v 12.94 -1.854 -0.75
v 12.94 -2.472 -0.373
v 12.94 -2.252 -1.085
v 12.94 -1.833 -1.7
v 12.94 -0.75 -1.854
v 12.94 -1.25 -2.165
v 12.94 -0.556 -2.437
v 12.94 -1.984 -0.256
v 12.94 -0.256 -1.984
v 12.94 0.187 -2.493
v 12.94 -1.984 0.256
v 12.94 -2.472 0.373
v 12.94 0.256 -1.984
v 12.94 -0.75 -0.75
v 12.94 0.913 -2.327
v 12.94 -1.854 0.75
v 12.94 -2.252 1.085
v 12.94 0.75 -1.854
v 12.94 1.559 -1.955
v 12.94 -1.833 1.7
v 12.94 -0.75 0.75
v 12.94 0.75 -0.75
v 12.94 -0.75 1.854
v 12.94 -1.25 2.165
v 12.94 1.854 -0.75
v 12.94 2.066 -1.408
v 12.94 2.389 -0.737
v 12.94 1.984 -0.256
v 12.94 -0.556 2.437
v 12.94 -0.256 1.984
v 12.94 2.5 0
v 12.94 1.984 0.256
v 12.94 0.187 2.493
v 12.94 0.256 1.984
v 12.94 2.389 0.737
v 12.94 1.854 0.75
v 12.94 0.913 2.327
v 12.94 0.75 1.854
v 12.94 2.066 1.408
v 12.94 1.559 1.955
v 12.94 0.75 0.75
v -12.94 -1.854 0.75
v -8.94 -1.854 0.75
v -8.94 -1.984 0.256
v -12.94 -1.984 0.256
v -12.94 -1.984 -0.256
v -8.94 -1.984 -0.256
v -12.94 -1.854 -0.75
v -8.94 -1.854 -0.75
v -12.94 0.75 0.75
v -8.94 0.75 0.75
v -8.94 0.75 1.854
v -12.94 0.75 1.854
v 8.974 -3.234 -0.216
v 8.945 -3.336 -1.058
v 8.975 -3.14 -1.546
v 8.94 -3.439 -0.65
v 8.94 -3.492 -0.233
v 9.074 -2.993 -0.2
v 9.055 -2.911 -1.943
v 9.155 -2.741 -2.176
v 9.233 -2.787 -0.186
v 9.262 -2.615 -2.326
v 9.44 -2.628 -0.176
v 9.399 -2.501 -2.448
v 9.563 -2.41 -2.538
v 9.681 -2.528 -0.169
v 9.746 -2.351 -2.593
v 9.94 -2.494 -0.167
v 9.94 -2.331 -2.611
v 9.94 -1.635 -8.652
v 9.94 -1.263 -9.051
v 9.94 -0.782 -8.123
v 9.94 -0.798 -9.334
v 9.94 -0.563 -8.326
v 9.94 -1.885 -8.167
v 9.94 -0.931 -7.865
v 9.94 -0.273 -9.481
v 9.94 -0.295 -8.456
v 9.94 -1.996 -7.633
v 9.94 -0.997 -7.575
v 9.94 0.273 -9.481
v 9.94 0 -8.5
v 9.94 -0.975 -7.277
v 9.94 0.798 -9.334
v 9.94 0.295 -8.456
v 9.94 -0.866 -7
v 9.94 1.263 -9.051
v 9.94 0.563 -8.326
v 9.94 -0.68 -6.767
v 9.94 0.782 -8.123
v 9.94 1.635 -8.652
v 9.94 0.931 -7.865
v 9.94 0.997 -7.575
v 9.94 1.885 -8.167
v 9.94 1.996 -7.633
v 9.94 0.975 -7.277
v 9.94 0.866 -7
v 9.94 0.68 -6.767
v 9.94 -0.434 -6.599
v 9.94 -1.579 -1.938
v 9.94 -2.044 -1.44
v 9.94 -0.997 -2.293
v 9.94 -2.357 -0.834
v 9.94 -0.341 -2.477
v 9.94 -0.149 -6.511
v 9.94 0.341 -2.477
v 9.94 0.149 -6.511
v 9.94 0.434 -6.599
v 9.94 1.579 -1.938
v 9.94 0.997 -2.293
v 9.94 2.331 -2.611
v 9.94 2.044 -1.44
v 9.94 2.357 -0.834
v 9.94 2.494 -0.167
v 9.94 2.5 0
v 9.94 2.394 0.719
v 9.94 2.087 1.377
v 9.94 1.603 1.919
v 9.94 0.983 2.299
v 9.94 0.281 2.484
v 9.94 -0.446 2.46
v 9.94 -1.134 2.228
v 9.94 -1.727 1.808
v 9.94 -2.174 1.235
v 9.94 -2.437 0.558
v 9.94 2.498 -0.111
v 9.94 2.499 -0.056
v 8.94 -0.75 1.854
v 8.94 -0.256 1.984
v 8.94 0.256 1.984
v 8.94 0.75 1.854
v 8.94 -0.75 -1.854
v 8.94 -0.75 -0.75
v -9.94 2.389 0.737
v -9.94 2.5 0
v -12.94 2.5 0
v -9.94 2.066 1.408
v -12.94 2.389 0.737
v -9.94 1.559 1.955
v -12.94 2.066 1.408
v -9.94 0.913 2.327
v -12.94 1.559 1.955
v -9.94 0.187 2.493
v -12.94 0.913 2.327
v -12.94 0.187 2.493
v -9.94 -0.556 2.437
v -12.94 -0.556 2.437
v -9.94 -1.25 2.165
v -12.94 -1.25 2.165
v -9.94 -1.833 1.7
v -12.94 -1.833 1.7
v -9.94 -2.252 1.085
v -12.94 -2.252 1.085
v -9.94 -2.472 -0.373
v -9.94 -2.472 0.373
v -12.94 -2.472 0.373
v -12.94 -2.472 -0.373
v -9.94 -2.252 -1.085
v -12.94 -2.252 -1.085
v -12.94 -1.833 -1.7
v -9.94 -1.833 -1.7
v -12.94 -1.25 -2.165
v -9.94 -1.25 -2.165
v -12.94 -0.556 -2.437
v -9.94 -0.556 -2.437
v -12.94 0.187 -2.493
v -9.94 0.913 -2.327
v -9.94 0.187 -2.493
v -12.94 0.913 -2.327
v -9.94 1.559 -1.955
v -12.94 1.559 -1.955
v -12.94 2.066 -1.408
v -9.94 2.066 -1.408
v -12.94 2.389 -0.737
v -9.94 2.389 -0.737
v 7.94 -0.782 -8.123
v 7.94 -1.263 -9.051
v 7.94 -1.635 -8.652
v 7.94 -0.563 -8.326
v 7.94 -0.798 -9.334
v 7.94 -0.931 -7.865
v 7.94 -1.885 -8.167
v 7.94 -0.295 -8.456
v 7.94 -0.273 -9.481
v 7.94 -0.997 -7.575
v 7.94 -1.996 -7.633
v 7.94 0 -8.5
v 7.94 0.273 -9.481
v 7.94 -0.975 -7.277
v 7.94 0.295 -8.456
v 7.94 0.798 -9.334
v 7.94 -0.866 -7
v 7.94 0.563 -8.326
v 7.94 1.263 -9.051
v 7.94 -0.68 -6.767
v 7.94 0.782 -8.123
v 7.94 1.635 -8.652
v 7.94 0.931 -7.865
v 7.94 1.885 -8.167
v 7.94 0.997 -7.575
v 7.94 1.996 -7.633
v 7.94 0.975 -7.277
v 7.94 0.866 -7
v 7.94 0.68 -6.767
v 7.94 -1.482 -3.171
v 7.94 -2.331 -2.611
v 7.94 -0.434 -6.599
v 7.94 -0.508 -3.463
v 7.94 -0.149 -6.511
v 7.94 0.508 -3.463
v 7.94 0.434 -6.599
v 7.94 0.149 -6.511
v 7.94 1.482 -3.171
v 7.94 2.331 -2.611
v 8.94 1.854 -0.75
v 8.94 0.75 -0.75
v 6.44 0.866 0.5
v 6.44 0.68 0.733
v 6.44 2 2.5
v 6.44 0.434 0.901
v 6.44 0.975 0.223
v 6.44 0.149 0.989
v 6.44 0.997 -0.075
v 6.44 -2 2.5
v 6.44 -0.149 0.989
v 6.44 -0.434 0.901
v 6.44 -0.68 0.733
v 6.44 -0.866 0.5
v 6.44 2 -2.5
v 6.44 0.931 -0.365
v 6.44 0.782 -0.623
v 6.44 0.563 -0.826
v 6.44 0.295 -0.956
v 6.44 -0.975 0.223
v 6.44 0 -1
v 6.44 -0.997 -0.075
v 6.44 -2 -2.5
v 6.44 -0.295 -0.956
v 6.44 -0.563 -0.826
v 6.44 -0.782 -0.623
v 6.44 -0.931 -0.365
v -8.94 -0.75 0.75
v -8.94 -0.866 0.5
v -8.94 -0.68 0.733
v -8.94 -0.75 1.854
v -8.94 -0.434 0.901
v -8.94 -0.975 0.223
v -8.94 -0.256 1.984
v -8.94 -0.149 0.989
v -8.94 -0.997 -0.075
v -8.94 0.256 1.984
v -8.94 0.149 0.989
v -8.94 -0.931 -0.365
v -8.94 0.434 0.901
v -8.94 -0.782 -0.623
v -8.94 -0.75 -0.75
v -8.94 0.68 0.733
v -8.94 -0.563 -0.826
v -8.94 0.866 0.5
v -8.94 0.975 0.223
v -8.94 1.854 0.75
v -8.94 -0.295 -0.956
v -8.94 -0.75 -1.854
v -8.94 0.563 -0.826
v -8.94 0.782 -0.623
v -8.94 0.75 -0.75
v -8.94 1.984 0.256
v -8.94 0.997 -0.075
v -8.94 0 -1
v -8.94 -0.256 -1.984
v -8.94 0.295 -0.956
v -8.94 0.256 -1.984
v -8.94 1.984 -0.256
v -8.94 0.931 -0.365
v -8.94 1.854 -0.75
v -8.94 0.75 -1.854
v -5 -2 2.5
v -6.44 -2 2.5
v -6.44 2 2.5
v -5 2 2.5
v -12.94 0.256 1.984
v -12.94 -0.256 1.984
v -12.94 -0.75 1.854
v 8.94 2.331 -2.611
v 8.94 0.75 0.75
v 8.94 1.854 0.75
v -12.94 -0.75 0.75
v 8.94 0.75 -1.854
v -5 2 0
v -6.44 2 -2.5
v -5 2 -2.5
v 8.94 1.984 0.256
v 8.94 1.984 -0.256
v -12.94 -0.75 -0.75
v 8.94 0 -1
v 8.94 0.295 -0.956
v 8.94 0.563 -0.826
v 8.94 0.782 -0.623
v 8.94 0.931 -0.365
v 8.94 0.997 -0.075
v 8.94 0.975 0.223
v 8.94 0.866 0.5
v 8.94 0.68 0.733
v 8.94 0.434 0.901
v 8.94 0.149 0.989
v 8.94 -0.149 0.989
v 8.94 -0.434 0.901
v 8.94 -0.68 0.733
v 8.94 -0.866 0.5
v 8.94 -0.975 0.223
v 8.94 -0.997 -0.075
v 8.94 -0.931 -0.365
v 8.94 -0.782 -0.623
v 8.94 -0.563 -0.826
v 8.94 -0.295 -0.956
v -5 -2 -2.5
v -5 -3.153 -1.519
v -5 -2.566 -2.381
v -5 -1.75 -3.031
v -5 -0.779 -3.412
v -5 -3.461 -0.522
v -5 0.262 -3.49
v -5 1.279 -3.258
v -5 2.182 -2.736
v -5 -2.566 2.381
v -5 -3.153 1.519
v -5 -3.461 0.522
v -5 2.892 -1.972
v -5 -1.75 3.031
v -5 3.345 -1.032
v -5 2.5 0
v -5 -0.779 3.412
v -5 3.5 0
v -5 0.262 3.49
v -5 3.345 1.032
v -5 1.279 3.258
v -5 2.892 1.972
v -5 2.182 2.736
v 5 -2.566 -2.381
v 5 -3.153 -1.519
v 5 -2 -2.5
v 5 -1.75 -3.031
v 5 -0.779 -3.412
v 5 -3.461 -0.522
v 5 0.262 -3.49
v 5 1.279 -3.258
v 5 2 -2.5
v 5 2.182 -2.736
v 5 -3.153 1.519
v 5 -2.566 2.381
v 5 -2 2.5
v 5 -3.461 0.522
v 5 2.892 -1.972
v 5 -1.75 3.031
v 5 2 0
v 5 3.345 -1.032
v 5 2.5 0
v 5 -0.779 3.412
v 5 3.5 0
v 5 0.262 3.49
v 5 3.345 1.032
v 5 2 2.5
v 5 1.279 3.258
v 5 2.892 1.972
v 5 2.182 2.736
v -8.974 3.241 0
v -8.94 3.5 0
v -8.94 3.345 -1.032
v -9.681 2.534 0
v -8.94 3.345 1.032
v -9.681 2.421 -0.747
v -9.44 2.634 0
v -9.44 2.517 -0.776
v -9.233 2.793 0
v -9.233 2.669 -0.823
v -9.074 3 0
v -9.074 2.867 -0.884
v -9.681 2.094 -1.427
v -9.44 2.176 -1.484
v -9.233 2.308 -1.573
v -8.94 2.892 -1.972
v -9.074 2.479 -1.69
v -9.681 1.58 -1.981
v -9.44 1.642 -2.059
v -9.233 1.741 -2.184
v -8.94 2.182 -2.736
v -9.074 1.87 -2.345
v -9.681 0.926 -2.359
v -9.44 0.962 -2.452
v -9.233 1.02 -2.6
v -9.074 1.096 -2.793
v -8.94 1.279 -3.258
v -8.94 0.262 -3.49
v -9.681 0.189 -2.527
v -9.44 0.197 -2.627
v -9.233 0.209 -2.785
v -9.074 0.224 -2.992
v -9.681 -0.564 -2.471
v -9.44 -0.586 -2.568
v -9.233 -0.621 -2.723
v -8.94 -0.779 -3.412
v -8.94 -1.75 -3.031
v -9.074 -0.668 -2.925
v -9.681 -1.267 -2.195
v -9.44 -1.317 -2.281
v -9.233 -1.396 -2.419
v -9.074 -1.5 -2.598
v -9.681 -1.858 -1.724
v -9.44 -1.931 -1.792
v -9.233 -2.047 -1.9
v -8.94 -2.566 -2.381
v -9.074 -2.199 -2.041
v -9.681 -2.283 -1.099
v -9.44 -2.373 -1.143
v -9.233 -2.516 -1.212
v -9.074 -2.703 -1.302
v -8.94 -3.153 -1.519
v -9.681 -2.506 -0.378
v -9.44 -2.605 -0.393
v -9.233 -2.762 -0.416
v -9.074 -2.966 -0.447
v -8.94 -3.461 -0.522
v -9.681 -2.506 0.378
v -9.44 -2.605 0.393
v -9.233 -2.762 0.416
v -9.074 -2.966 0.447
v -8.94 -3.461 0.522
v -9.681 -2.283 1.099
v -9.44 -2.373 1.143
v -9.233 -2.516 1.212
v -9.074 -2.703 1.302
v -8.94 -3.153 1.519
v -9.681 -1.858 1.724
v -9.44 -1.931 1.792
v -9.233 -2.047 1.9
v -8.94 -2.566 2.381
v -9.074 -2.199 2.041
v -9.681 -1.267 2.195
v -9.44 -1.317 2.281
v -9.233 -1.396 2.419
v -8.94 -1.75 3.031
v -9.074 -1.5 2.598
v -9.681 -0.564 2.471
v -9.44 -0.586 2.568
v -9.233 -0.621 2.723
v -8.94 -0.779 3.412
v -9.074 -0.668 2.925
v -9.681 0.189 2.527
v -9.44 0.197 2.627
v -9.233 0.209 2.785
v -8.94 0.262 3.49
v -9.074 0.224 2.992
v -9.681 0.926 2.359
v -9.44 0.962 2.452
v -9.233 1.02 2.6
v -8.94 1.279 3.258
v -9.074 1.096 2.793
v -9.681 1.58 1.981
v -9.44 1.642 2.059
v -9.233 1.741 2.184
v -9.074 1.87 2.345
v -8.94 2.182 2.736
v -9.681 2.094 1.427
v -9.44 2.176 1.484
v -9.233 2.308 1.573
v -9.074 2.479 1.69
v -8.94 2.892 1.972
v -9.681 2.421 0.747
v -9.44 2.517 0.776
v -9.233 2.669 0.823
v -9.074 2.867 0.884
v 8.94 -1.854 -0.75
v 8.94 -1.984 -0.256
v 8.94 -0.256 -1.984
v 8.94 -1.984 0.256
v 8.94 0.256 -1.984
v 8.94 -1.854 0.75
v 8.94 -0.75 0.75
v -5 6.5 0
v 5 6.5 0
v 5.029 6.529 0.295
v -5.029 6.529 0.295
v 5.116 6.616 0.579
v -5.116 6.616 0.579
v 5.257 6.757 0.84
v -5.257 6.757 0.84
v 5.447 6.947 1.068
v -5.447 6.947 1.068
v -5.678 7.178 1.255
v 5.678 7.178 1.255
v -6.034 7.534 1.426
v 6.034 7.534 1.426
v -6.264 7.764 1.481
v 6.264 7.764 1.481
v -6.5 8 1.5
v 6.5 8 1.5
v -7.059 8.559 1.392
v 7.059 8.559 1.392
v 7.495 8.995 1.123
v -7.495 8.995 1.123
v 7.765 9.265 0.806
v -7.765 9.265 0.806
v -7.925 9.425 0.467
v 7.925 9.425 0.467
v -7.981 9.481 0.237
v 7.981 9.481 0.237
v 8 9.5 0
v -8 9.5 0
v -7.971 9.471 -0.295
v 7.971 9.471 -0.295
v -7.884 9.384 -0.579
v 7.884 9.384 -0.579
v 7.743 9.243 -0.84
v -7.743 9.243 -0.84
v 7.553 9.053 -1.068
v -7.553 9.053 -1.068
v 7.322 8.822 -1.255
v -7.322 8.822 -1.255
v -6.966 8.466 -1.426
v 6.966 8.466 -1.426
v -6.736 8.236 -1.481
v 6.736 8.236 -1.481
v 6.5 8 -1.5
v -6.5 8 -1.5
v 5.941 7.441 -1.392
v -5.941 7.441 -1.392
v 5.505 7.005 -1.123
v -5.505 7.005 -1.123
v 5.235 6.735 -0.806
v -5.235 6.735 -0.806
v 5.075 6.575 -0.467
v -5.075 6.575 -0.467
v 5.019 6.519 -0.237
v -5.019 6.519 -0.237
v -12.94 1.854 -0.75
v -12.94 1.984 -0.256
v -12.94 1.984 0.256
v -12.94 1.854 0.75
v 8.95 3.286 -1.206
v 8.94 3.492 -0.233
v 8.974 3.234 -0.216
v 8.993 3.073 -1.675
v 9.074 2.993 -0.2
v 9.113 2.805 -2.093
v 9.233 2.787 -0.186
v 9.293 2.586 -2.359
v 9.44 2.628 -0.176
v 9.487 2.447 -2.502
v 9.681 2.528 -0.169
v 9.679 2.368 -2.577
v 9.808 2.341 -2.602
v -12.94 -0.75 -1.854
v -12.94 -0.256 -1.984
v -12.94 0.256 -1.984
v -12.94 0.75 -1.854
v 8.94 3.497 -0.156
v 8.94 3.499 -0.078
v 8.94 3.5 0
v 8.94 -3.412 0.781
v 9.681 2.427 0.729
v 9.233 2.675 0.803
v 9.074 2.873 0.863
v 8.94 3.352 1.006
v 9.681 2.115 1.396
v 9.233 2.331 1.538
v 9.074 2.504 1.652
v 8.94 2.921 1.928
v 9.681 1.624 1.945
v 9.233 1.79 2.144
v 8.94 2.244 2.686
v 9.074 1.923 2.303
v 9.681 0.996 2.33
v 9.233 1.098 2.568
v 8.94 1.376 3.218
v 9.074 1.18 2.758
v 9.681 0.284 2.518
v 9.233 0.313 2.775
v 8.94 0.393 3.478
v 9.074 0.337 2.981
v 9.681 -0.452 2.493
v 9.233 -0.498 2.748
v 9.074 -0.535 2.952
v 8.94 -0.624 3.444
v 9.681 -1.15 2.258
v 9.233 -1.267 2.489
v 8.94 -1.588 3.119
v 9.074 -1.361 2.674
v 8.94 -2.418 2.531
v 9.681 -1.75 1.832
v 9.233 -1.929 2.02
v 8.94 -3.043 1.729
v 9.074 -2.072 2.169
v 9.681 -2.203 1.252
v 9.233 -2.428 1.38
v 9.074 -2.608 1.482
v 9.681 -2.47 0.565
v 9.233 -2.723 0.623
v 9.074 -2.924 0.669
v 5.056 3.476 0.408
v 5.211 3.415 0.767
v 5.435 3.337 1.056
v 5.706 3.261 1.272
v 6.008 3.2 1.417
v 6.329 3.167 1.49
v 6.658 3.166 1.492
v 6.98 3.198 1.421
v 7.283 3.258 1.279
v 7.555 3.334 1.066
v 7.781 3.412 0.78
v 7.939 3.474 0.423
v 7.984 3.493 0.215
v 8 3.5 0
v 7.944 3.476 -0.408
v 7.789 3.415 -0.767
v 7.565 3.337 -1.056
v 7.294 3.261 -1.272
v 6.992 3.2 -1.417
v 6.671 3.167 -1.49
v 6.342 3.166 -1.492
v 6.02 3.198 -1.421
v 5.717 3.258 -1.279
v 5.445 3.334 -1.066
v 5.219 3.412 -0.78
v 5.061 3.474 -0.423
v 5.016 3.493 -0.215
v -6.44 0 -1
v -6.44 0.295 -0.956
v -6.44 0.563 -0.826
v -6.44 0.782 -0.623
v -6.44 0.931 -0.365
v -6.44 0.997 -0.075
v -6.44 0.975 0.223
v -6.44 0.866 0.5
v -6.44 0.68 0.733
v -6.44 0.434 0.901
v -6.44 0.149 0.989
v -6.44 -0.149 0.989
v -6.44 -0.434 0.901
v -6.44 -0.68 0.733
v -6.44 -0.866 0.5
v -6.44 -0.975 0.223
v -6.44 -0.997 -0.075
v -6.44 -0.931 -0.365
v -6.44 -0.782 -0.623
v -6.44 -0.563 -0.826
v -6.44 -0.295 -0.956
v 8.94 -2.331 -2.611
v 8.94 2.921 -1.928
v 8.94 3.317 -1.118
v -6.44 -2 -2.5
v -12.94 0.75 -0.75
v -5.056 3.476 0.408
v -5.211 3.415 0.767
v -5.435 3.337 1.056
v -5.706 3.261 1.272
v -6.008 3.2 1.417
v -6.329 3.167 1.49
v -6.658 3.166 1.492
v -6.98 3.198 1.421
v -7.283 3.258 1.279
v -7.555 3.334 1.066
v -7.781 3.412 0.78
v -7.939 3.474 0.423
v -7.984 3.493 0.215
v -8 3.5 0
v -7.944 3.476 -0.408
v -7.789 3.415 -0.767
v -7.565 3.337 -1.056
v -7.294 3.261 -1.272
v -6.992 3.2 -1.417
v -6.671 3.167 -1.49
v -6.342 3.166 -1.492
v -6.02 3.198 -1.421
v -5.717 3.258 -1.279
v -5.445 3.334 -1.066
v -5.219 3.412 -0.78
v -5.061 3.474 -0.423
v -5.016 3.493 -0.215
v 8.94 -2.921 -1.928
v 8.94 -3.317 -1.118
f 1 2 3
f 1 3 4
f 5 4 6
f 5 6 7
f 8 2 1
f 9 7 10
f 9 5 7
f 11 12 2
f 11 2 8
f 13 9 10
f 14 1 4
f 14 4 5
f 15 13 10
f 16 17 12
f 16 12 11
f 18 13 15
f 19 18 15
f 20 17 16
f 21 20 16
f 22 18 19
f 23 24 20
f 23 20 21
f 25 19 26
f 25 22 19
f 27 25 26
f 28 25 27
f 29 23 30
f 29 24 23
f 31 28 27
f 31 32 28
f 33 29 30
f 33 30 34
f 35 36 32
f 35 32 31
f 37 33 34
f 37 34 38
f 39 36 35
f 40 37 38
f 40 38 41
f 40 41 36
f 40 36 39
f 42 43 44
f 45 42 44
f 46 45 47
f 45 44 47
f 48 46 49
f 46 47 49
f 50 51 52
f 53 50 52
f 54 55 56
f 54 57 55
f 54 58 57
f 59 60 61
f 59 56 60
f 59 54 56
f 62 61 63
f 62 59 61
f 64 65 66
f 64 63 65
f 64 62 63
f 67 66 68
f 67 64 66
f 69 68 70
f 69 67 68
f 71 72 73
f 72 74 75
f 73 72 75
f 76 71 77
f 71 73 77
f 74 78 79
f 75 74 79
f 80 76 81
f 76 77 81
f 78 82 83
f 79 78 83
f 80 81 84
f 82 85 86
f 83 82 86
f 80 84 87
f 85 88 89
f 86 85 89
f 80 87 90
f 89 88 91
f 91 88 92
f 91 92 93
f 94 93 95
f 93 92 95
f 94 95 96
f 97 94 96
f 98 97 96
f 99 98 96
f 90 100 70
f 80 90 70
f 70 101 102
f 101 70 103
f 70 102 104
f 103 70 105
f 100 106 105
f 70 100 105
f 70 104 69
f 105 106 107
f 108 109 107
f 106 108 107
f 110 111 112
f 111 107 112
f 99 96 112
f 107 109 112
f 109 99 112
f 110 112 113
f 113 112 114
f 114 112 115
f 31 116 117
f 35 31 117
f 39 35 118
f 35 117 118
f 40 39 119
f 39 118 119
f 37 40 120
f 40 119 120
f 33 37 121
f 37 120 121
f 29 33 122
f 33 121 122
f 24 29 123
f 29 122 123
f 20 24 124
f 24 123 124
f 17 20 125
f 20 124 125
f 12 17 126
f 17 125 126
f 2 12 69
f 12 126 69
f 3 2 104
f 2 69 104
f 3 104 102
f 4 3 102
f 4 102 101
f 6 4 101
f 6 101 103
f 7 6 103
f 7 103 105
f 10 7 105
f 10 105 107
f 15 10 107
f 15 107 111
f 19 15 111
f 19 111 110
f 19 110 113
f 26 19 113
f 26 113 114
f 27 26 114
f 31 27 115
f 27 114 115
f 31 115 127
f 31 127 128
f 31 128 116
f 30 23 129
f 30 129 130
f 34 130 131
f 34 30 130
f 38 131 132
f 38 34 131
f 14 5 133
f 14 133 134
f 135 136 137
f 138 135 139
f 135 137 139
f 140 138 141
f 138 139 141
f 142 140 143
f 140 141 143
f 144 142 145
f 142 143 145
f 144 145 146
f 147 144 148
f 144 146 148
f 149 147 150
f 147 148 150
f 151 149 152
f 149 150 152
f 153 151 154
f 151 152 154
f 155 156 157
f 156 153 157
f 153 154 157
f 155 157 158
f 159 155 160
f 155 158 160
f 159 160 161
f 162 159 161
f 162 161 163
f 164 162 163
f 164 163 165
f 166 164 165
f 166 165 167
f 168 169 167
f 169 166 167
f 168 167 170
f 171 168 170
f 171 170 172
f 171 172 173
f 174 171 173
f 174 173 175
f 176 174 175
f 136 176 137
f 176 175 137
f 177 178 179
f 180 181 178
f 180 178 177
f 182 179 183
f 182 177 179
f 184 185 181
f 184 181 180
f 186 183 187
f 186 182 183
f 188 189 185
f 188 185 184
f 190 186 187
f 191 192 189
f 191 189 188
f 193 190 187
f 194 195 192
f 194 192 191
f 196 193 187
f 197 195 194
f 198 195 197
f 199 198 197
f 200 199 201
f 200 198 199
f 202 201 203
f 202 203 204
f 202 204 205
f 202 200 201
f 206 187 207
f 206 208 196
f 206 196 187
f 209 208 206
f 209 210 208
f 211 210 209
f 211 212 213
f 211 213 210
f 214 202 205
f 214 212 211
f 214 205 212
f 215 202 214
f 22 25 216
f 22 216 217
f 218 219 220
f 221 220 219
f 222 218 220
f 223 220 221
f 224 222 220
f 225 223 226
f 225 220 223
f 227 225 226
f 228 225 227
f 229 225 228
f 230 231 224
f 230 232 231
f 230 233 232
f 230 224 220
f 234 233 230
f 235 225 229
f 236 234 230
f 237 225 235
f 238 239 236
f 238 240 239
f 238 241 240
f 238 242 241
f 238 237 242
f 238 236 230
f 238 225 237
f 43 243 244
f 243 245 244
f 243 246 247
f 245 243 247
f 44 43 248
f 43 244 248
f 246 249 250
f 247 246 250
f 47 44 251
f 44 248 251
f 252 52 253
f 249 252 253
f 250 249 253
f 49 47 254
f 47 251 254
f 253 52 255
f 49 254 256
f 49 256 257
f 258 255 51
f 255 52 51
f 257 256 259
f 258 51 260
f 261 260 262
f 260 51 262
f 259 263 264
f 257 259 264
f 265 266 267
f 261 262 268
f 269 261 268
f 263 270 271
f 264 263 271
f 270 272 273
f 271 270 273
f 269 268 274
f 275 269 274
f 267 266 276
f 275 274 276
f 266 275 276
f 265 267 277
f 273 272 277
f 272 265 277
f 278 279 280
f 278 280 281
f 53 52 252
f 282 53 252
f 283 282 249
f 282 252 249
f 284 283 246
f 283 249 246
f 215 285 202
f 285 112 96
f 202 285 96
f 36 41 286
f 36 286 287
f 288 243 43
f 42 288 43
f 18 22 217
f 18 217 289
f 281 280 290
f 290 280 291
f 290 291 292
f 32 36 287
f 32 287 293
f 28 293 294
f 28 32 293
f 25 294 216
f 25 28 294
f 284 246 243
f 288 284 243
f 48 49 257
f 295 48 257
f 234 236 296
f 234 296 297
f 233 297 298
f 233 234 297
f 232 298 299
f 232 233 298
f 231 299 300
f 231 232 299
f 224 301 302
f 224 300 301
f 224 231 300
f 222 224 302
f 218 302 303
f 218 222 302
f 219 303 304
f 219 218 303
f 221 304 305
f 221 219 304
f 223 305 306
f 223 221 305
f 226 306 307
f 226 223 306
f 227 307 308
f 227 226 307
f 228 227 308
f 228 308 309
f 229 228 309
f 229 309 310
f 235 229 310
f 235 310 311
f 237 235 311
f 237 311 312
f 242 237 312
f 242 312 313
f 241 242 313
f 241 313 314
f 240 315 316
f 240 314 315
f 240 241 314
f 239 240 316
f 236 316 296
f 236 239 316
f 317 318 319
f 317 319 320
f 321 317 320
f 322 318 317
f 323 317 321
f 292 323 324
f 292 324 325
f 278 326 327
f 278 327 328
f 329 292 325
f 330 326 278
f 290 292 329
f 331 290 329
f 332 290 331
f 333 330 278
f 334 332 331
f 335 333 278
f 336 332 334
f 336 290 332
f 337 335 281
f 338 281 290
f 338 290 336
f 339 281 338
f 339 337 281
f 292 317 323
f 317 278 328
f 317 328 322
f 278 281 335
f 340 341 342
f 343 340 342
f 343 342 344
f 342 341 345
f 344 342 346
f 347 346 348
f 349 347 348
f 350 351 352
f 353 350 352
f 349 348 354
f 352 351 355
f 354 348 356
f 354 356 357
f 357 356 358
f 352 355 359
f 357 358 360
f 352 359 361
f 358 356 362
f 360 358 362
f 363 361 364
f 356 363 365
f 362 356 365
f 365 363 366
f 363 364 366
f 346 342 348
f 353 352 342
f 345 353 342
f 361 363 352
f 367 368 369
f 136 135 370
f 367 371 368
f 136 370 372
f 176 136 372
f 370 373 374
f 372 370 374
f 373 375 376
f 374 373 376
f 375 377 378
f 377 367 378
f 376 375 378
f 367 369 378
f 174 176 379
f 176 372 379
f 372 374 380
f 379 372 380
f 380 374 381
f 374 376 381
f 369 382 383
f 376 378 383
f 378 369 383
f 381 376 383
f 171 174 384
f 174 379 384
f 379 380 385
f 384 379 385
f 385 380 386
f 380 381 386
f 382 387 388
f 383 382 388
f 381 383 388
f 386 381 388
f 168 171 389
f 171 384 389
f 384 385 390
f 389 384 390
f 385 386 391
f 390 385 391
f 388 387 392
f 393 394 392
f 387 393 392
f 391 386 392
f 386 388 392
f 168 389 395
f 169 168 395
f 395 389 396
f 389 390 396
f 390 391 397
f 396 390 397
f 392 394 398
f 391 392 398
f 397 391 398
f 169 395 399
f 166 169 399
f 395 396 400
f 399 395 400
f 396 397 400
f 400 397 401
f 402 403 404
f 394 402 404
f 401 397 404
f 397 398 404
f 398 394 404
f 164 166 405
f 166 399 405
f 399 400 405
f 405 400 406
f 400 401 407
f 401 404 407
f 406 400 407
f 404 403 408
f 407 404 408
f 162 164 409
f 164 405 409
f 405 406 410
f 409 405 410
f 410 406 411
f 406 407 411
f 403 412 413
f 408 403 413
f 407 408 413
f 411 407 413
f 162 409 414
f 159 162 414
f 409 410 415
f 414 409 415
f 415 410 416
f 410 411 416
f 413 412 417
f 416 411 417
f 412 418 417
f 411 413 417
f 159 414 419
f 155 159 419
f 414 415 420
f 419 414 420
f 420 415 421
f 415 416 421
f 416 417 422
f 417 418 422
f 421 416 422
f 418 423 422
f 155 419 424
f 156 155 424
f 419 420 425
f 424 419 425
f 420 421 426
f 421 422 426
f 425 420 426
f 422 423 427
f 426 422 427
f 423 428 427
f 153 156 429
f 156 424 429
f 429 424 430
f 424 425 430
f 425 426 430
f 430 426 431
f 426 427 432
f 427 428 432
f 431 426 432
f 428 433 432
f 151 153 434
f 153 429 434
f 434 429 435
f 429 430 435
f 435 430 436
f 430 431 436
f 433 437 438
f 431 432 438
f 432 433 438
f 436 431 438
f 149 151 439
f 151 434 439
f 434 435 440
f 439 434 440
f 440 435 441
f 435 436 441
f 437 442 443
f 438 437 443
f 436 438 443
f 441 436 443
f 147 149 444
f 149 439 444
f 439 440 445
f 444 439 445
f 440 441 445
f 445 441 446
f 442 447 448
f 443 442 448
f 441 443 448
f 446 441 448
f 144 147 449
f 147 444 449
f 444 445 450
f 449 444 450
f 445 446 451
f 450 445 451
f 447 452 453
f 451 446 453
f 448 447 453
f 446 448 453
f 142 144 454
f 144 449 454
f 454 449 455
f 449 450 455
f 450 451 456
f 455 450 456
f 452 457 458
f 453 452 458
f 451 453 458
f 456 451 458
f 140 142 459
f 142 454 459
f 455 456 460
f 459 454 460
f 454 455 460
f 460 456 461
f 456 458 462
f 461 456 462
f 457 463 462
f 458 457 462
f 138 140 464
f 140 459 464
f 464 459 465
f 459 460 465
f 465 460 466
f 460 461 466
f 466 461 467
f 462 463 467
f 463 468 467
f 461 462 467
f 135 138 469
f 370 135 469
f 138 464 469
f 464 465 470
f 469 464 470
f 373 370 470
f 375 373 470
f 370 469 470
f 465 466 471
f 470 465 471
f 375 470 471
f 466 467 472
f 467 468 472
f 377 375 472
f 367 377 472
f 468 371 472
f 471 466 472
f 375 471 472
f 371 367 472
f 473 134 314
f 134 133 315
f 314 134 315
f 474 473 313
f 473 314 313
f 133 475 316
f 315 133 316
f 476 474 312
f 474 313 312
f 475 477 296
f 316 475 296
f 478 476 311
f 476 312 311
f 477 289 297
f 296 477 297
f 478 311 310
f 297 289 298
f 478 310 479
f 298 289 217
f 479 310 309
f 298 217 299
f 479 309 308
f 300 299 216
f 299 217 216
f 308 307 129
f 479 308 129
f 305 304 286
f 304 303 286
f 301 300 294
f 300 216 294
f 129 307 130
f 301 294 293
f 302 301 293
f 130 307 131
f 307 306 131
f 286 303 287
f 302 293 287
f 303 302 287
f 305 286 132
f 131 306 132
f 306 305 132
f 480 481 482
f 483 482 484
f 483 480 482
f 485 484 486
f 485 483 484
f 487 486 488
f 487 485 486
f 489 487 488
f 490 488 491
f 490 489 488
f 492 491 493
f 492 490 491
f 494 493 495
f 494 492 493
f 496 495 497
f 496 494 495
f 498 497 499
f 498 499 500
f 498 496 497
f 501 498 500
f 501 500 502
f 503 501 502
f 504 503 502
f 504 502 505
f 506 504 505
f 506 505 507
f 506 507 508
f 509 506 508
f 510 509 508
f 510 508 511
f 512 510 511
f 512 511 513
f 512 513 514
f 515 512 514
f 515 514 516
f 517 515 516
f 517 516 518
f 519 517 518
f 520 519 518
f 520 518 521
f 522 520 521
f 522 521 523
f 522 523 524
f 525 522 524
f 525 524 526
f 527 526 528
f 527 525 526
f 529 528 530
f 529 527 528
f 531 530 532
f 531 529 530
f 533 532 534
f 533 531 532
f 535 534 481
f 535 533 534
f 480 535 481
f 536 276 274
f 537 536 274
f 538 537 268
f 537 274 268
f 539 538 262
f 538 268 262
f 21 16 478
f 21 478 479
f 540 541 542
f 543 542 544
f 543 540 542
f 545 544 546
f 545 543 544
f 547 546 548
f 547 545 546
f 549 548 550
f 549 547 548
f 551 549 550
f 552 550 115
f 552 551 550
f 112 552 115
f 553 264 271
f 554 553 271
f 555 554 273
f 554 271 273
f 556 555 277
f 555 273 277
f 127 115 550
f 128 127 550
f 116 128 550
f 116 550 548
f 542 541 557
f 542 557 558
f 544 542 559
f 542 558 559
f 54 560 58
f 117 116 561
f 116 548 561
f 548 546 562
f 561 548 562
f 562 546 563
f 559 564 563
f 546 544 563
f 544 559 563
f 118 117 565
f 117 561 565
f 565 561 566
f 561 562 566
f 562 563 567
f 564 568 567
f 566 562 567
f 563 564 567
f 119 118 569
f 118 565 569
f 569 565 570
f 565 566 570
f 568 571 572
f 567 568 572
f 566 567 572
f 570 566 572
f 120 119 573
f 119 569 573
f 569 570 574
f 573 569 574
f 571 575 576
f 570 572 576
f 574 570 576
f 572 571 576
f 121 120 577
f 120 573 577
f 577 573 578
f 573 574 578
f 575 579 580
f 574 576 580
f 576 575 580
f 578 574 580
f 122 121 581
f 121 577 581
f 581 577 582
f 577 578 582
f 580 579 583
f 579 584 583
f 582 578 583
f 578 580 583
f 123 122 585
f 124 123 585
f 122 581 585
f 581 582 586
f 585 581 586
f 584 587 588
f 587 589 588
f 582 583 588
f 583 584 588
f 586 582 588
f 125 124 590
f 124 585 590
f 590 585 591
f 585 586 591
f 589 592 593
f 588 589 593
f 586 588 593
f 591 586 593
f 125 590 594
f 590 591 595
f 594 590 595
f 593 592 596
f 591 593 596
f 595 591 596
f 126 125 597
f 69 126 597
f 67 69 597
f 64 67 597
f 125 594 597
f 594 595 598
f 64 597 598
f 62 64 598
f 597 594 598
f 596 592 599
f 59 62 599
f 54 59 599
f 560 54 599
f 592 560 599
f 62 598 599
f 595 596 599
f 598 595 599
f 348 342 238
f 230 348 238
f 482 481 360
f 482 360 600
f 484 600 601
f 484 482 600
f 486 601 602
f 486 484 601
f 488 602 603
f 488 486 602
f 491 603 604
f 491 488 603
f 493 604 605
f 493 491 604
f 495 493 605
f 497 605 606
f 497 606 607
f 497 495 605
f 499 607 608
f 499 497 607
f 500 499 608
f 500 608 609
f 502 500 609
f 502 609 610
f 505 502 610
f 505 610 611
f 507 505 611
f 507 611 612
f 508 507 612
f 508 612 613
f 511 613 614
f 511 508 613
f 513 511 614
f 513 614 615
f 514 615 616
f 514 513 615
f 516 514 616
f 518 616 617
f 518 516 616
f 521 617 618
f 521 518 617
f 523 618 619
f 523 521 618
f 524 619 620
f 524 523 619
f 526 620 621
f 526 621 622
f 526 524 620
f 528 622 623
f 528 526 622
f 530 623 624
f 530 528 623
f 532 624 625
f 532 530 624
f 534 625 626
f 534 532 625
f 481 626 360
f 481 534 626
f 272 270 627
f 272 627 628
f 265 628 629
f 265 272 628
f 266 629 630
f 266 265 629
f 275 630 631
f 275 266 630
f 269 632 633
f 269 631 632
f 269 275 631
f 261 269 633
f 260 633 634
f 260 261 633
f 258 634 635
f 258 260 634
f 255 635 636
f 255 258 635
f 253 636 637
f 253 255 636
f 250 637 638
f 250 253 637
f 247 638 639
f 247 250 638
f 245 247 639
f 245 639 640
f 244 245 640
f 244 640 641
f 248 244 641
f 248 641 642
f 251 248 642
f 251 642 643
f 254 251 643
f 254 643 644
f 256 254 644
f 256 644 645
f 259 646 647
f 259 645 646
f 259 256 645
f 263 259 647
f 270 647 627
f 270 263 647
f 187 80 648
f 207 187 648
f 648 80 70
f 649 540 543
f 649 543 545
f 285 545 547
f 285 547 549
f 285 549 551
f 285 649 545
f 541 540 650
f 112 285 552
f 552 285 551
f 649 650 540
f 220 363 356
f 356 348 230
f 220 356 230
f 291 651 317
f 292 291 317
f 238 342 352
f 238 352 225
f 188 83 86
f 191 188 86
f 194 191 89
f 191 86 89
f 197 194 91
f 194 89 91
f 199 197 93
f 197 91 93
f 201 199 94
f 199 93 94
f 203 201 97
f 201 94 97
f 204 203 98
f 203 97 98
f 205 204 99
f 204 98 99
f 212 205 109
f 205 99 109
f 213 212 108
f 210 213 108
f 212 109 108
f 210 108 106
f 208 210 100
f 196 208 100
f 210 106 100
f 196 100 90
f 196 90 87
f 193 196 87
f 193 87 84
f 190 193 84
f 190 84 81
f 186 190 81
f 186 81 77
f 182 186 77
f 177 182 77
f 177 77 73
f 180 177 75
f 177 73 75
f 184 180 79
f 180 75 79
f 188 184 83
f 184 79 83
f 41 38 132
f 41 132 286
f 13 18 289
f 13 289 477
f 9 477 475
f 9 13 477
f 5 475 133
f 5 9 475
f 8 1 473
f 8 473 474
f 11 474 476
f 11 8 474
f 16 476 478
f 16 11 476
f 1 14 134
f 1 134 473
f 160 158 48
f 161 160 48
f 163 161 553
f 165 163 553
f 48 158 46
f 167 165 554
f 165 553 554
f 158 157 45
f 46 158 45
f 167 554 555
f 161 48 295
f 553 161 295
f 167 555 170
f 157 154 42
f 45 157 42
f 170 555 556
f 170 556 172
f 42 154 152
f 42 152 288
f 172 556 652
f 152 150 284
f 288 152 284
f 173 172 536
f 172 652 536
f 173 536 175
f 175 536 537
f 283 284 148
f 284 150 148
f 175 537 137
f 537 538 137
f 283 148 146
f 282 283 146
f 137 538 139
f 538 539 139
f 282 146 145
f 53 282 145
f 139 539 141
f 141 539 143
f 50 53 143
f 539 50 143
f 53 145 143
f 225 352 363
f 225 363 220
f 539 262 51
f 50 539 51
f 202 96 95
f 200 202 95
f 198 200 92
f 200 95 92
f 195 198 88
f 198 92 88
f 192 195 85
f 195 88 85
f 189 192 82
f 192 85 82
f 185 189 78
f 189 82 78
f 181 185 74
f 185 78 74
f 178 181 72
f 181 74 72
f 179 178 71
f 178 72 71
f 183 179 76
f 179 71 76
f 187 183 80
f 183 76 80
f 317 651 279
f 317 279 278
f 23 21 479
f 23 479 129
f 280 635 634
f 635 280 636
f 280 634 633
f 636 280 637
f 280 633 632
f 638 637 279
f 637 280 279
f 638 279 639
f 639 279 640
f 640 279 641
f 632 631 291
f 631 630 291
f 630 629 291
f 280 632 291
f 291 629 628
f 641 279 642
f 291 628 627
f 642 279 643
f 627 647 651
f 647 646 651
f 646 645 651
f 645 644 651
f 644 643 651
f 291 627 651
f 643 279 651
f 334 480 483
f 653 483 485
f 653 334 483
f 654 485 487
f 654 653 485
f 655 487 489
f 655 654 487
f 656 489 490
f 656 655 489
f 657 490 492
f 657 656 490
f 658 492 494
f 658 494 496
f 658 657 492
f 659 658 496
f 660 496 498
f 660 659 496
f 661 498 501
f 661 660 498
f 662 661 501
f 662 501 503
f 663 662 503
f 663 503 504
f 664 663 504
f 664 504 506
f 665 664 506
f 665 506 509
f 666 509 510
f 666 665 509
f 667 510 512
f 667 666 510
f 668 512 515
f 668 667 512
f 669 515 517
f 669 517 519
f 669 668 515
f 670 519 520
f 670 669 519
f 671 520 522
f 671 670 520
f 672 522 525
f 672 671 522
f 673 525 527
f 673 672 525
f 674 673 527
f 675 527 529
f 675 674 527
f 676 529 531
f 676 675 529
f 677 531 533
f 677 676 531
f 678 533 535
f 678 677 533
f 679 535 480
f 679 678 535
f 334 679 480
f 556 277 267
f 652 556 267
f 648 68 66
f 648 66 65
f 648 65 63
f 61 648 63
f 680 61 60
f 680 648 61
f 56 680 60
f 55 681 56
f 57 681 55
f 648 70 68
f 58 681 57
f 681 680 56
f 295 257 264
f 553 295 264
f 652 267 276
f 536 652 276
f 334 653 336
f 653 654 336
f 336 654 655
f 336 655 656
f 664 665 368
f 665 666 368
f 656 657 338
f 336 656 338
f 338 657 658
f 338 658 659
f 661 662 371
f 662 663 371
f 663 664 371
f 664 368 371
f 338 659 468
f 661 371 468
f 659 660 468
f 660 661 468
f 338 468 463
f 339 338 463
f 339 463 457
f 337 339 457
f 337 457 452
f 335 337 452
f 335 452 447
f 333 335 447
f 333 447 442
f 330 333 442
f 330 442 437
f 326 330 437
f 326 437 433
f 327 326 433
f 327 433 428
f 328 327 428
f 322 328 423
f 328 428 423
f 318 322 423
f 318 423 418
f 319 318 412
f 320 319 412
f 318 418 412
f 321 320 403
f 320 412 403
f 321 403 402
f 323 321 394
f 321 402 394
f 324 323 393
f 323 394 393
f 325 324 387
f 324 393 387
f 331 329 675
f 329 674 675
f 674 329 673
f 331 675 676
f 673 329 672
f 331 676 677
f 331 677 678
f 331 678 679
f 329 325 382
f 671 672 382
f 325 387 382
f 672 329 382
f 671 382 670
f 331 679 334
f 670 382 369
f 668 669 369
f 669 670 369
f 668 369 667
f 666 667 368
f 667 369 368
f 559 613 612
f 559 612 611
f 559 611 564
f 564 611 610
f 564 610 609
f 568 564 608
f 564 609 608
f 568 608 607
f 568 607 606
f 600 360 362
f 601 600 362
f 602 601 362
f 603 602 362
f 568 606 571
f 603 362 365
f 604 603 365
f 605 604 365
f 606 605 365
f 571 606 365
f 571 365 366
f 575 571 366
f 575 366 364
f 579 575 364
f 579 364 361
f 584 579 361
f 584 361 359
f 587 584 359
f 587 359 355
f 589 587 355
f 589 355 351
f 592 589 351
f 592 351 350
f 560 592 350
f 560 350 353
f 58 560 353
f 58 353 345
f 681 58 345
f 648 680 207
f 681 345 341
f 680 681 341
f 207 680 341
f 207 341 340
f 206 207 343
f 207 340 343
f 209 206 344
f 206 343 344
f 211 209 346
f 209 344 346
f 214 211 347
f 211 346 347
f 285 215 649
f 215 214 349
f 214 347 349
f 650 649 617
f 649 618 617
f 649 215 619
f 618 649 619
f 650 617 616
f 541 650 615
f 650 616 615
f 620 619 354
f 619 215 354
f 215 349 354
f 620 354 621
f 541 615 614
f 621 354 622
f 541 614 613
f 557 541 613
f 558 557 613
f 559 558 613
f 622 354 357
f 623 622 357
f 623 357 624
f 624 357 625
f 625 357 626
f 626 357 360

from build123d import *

# Parameters (mm, degrees)
SWEEP_1_PROFILE_R        = 1.5
EXTRUDE_1_DEPTH          = 3.44
EXTRUDE_1_DEPTH_BACK     = 4.5
EXTRUDE_1_START          = 9.5
SKETCH_8_R               = 2.5
EXTRUDE_2_DEPTH          = 4.5
EXTRUDE_2_DEPTH_BACK     = 3.44
EXTRUDE_2_START          = -9.5
SKETCH_9_R               = 2.5
EXTRUDE_START            = 9.94
SKETCH_14_R              = 1
EXTRUDE_3_DEPTH          = 2
CUT_EXTRUDE_START        = 12.94
CUT_EXTRUDE_1_DEPTH      = 4
CUT_EXTRUDE_START_2      = -8.94
CUT_EXTRUDE_2_DEPTH      = 4
SKETCH_16_R              = 0.25
CUT_EXTRUDE_3_DEPTH      = 0.25
CUT_EXTRUDE_START_3      = 8.69
SKETCH_17_R              = 0.25
CUT_EXTRUDE_4_DEPTH      = 0.25
EXTRUDE_START_2          = 5
SKETCH_18_R              = 3.5
EXTRUDE_4_DEPTH          = 3.94
EXTRUDE_START_3          = -8.94
SKETCH_20_R              = 3.5
EXTRUDE_5_DEPTH          = 3.94
CUT_EXTRUDE_5_DEPTH      = 2
CUT_EXTRUDE_5_DEPTH_BACK = 2
SKETCH_22_W              = 1.44
SKETCH_22_H              = 5
CUT_EXTRUDE_6_DEPTH      = 19.653246417
CUT_EXTRUDE_6_DEPTH_BACK = 19.653246417
SKETCH_25_R              = 1
FILLET_1_R               = 1


with BuildPart() as part:
    # 扫描1: sweep along a path in 草图1
    with BuildLine(Plane.XY) as sweep_1_path:
        Line((9.5, 0), (6.5, 0))
        Line((6.5, 0), (6.5, 8))
        Line((6.5, 8), (-6.5, 8))
        Line((-6.5, 8), (-6.5, 0))
        Line((-6.5, 0), (-9.5, 0))
    # 扫描1 profile (on start of the path) → 扫描1 (sweep)
    with BuildSketch(Plane(origin=(9.5, 0, 0), x_dir=(0, -1, 0), z_dir=(-1, 0, 0))):
        Circle(SWEEP_1_PROFILE_R)
    sweep(path=sweep_1_path.line, transition=Transition.RIGHT)

    # 草图8 → 凸台-拉伸1 (add, two sides: drawn at the far end of the back side and taken through both)
    with BuildSketch(Plane(origin=(0, 0, 0), x_dir=(0, 0, -1), z_dir=(1, 0, 0)).offset(EXTRUDE_1_START - EXTRUDE_1_DEPTH_BACK)):
        with Locations(Location((0, 0, 0), (0, 0, 90))):
            Circle(SKETCH_8_R)
    extrude(amount=EXTRUDE_1_DEPTH + EXTRUDE_1_DEPTH_BACK)

    # 草图9 → 凸台-拉伸2 (add, two sides: drawn at the far end of the back side and taken through both)
    with BuildSketch(Plane(origin=(0, 0, 0), x_dir=(0, 0, -1), z_dir=(1, 0, 0)).offset(EXTRUDE_2_START - EXTRUDE_2_DEPTH_BACK)):
        with Locations(Location((0, 0, 0), (0, 0, 90))):
            Circle(SKETCH_9_R)
    extrude(amount=EXTRUDE_2_DEPTH + EXTRUDE_2_DEPTH_BACK)

    # 草图14 → 凸台-拉伸3 (add)
    with BuildSketch(Plane(origin=(0, 0, 0), x_dir=(0, 0, -1), z_dir=(1, 0, 0)).offset(EXTRUDE_START)):
        with BuildLine():
            Line((0.166666667, 2.494438258), (7.633333333, 1.995550606))
            ThreePointArc((7.633333333, 1.995550606), (9.5, 0), (7.633333333, -1.995550606))
            Line((7.633333333, -1.995550606), (0.166666667, -2.494438258))
            ThreePointArc((0.166666667, -2.494438258), (-2.5, 0), (0.166666667, 2.494438258))
        make_face()
        with Locations((7.5, 0)):
            Circle(SKETCH_14_R, mode=Mode.SUBTRACT)
    extrude(amount=-EXTRUDE_3_DEPTH)

    # 草图10 → 切除-拉伸1 (cut)
    with BuildSketch(Plane(origin=(0, 0, 0), x_dir=(0, 0, -1), z_dir=(1, 0, 0)).offset(CUT_EXTRUDE_START)):
        with BuildLine():
            Line((0.75, 0.75), (1.854049622, 0.75))
            ThreePointArc((1.854049622, 0.75), (2, 0), (1.854049622, -0.75))
            Line((1.854049622, -0.75), (0.75, -0.75))
            Line((0.75, -0.75), (0.75, -1.854049622))
            ThreePointArc((0.75, -1.854049622), (0, -2), (-0.75, -1.854049622))
            Line((-0.75, -1.854049622), (-0.75, -0.75))
            Line((-0.75, -0.75), (-1.854049622, -0.75))
            ThreePointArc((-1.854049622, -0.75), (-2, 0), (-1.854049622, 0.75))
            Line((-1.854049622, 0.75), (-0.75, 0.75))
            Line((-0.75, 0.75), (-0.75, 1.854049622))
            ThreePointArc((-0.75, 1.854049622), (0, 2), (0.75, 1.854049622))
            Line((0.75, 1.854049622), (0.75, 0.75))
        make_face()
    extrude(amount=-CUT_EXTRUDE_1_DEPTH, mode=Mode.SUBTRACT)

    # 草图11 → 切除-拉伸2 (cut)
    with BuildSketch(Plane(origin=(0, 0, 0), x_dir=(0, 0, -1), z_dir=(1, 0, 0)).offset(CUT_EXTRUDE_START_2)):
        with BuildLine():
            Line((0.75, 0.75), (0.75, 1.854049622))
            ThreePointArc((0.75, 1.854049622), (0, 2), (-0.75, 1.854049622))
            Line((-0.75, 1.854049622), (-0.75, 0.75))
            Line((-0.75, 0.75), (-1.854049622, 0.75))
            ThreePointArc((-1.854049622, 0.75), (-2, 0), (-1.854049622, -0.75))
            Line((-1.854049622, -0.75), (-0.75, -0.75))
            Line((-0.75, -0.75), (-0.75, -1.854049622))
            ThreePointArc((-0.75, -1.854049622), (0, -2), (0.75, -1.854049622))
            Line((0.75, -1.854049622), (0.75, -0.75))
            Line((0.75, -0.75), (1.854049622, -0.75))
            ThreePointArc((1.854049622, -0.75), (2, 0), (1.854049622, 0.75))
            Line((1.854049622, 0.75), (0.75, 0.75))
        make_face()
    extrude(amount=-CUT_EXTRUDE_2_DEPTH, mode=Mode.SUBTRACT)

    # 草图16 → 切除-拉伸3 (cut)
    with BuildSketch(Plane(origin=(0, 0, 0), x_dir=(0, 0, -1), z_dir=(1, 0, 0)).offset(CUT_EXTRUDE_START_2)):
        with Locations(Location((0.75, 0, 0), (0, 0, 90))):
            Circle(SKETCH_16_R)
    extrude(amount=CUT_EXTRUDE_3_DEPTH, mode=Mode.SUBTRACT)

    # 草图17 → 切除-拉伸4 (cut)
    with BuildSketch(Plane(origin=(0, 0, 0), x_dir=(0, 0, -1), z_dir=(1, 0, 0)).offset(CUT_EXTRUDE_START_3)):
        with Locations(Location((0.75, 0, 0), (0, 0, 90))):
            Circle(SKETCH_17_R)
    extrude(amount=CUT_EXTRUDE_4_DEPTH, mode=Mode.SUBTRACT)

    # 草图18 → 凸台-拉伸4 (add)
    with BuildSketch(Plane(origin=(0, 0, 0), x_dir=(0, 0, -1), z_dir=(1, 0, 0)).offset(EXTRUDE_START_2)):
        with Locations(Location((0, 0, 0), (0, 0, 90))):
            Circle(SKETCH_18_R)
    extrude(amount=EXTRUDE_4_DEPTH)

    # 草图20 → 凸台-拉伸5 (add)
    with BuildSketch(Plane(origin=(0, 0, 0), x_dir=(0, 0, -1), z_dir=(1, 0, 0)).offset(EXTRUDE_START_3)):
        with Locations(Location((0, 0, 0), (0, 0, 90))):
            Circle(SKETCH_20_R)
    extrude(amount=EXTRUDE_5_DEPTH)

    # 草图22 → 切除-拉伸5 (cut, two sides: drawn at the far end of the back side and taken through both)
    with BuildSketch(Plane(origin=(0, 0, 0), x_dir=(1, 0, 0), z_dir=(0, 1, 0)).offset(-CUT_EXTRUDE_5_DEPTH_BACK)):
        with Locations((-5.72, 0)):
            Rectangle(SKETCH_22_W, SKETCH_22_H)
        with Locations((5.72, 0)):
            Rectangle(SKETCH_22_W, SKETCH_22_H)
    extrude(amount=CUT_EXTRUDE_5_DEPTH + CUT_EXTRUDE_5_DEPTH_BACK, mode=Mode.SUBTRACT)

    # 草图25 → 切除-拉伸6 (cut, two sides: drawn at the far end of the back side and taken through both)
    with BuildSketch(Plane(origin=(0, 0, 0), x_dir=(0, 0, -1), z_dir=(1, 0, 0)).offset(-CUT_EXTRUDE_6_DEPTH_BACK)):
        Circle(SKETCH_25_R)
    extrude(amount=CUT_EXTRUDE_6_DEPTH + CUT_EXTRUDE_6_DEPTH_BACK, mode=Mode.SUBTRACT)

    # 圆角1
    # the kernel refuses this fillet: 1 mm, written as the material it adds along each edge
    with BuildSketch(Plane(origin=(-8.94, 0, 0), x_dir=(0, 1, 0), z_dir=(0, 0, 1))) as fillet_1_piece_1:
        with BuildLine():
            CenterArc((2.5 + FILLET_1_R, FILLET_1_R), FILLET_1_R, 180, 90)
            Line((2.5, FILLET_1_R), (2.5, 0))
            Line((2.5, 0), (2.5 + FILLET_1_R, 0))
        make_face()
    revolve(axis=Axis((-8.94, 0, 0), (-1, 0, 0)))
    with BuildSketch(Plane(origin=(8.94, 0, 0), x_dir=(0, 1, 0), z_dir=(0, 0, -1))) as fillet_1_piece_2:
        with BuildLine():
            CenterArc((2.5 + FILLET_1_R, FILLET_1_R), FILLET_1_R, 180, 90)
            Line((2.5 + FILLET_1_R, 0), (2.5, 0))
            Line((2.5, 0), (2.5, FILLET_1_R))
        make_face()
    revolve(axis=Axis((8.94, 0, 0), (1, 0, 0)), revolution_arc=183.822553729)
    with BuildSketch(Plane(origin=(8.94, -2.494438258, -0.166666667), x_dir=(1, 0, 0), z_dir=(0, 0.06666666666666658, -0.9977753031397177))) as fillet_1_piece_3_section:
        with BuildLine():
            CenterArc((FILLET_1_R, FILLET_1_R), FILLET_1_R, 180, 90)
            Line((0, FILLET_1_R), (0, 0))
            Line((0, 0), (FILLET_1_R, 0))
        make_face()
    fillet_1_piece_3 = extrude(amount=4.949489743, mode=Mode.PRIVATE)
    fillet_1_piece_3 = fillet_1_piece_3 & Plane(origin=(9.184299624, 0, 0), x_dir=(0, 1, 0), z_dir=(-1, 0, 0)) * Cylinder(3.5, 14, mode=Mode.PRIVATE)
    add(fillet_1_piece_3)
    with BuildSketch(Plane(origin=(8.94, 2.164472275, -5.105145295), x_dir=(0, 0.9977753031397177, -0.0666666666666666), z_dir=(0, 0.06666666666666658, 0.9977753031397177))) as fillet_1_piece_4_section:
        with BuildLine():
            CenterArc((FILLET_1_R, -FILLET_1_R), FILLET_1_R, 90, 90)
            Line((0, -FILLET_1_R), (0, 0))
            Line((0, 0), (FILLET_1_R, 0))
        make_face()
    fillet_1_piece_4 = extrude(amount=4.949489743, mode=Mode.PRIVATE)
    fillet_1_piece_4 = fillet_1_piece_4 & Plane(origin=(9.184299625, 0, 0), x_dir=(0, 1, 0), z_dir=(-1, 0, 0)) * Cylinder(3.5, 14, mode=Mode.PRIVATE)
    add(fillet_1_piece_4)
    with BuildSketch(Plane(origin=(8.94, 0, 0), x_dir=(0, 0.9977753030864385, -0.06666666746407793), z_dir=(0, -0.06666666746407793, -0.9977753030864385))) as fillet_1_piece_5:
        with BuildLine():
            CenterArc((2.5 + FILLET_1_R, FILLET_1_R), FILLET_1_R, 180, 90)
            Line((2.5, FILLET_1_R), (2.5, 0))
            Line((2.5, 0), (2.5 + FILLET_1_R, 0))
        make_face()
    revolve(axis=Axis((8.94, 0, 0), (1, 0, 0)), revolution_arc=3.822553775)


solid = part.part
